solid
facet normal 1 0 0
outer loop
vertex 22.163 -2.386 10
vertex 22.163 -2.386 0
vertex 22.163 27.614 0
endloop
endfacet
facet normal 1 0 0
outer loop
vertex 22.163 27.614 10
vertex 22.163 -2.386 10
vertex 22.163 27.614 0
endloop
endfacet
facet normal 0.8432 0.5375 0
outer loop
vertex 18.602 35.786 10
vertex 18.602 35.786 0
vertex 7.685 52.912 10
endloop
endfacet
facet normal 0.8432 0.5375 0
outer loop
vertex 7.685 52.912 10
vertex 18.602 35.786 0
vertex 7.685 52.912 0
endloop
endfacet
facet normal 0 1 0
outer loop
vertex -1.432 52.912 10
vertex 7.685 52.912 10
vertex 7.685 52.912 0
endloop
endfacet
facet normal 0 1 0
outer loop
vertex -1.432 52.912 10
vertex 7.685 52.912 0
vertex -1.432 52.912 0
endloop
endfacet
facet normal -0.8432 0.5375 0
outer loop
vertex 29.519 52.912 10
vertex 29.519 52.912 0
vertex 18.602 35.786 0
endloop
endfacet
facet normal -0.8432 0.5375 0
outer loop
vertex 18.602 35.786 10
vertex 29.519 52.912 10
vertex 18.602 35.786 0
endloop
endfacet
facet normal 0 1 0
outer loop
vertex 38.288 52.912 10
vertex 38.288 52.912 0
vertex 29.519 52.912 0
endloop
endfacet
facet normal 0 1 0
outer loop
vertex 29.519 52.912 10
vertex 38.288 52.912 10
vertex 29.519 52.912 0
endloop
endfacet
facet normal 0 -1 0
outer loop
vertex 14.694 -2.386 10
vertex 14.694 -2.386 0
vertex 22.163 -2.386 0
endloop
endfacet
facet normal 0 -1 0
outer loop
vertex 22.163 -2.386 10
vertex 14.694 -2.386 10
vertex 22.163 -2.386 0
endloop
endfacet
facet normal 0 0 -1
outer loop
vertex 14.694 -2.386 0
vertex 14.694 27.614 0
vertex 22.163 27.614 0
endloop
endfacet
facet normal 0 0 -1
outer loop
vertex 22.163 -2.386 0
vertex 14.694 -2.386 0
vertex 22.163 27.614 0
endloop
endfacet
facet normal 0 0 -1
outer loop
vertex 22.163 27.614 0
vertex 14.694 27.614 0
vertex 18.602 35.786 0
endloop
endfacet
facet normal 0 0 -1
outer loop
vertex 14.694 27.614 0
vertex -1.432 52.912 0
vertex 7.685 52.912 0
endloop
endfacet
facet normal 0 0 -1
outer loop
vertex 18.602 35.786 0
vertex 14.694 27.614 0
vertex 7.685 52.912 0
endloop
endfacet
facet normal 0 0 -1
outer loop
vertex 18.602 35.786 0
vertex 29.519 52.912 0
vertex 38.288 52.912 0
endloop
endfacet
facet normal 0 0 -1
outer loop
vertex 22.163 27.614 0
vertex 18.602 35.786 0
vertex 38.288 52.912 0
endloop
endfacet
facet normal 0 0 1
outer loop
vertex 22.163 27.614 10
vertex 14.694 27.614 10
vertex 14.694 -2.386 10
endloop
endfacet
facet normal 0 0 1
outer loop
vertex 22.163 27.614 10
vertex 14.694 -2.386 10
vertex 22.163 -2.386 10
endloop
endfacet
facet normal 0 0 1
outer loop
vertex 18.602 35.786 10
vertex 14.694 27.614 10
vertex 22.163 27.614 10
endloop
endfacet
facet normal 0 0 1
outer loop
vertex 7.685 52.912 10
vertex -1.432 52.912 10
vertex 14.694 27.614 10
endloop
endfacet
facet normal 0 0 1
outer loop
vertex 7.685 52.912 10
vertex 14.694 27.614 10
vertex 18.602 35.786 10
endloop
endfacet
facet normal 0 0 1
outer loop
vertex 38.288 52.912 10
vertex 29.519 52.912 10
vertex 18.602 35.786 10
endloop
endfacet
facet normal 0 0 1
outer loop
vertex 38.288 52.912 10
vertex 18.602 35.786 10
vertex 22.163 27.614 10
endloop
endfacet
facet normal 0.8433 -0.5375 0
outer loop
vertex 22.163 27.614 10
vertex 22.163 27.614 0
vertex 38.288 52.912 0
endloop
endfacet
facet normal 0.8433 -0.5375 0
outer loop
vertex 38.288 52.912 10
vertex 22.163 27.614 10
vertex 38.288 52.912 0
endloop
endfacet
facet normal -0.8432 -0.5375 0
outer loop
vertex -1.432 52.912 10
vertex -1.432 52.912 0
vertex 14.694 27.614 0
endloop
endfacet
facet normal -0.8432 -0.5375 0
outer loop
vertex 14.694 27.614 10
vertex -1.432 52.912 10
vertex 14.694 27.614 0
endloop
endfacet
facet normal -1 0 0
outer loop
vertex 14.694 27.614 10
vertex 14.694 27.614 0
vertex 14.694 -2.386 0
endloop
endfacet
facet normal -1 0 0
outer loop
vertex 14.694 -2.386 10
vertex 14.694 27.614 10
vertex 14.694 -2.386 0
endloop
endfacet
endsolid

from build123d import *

# Parameters (mm, degrees)
F1_DEPTH = 10


with BuildPart() as f1:
    # F0 (on Top) → F1 (new body)
    with BuildSketch(Plane.XY):
        Polygon((21.119604, 31.836453), (18.428353, 27.614467), (18.428353, -2.385533), (22.162743, -2.385533), (22.162743, 27.614467), (38.288332, 52.912004), (34.553942, 52.912004), align=None)
        Polygon((2.302764, 52.912004), (18.428353, 27.614467), (21.119604, 31.836453), (18.601938, 35.786123), (7.685266, 52.912004), align=None)
        Polygon((18.428353, -2.385533), (18.428353, 27.614467), (2.302764, 52.912004), (-1.431626, 52.912004), (14.693964, 27.614467), (14.693964, -2.385533), align=None)
        Polygon((18.601938, 35.786123), (21.119604, 31.836453), (34.553942, 52.912004), (29.51861, 52.912004), align=None)
    extrude(amount=F1_DEPTH)


solid = f1.part
